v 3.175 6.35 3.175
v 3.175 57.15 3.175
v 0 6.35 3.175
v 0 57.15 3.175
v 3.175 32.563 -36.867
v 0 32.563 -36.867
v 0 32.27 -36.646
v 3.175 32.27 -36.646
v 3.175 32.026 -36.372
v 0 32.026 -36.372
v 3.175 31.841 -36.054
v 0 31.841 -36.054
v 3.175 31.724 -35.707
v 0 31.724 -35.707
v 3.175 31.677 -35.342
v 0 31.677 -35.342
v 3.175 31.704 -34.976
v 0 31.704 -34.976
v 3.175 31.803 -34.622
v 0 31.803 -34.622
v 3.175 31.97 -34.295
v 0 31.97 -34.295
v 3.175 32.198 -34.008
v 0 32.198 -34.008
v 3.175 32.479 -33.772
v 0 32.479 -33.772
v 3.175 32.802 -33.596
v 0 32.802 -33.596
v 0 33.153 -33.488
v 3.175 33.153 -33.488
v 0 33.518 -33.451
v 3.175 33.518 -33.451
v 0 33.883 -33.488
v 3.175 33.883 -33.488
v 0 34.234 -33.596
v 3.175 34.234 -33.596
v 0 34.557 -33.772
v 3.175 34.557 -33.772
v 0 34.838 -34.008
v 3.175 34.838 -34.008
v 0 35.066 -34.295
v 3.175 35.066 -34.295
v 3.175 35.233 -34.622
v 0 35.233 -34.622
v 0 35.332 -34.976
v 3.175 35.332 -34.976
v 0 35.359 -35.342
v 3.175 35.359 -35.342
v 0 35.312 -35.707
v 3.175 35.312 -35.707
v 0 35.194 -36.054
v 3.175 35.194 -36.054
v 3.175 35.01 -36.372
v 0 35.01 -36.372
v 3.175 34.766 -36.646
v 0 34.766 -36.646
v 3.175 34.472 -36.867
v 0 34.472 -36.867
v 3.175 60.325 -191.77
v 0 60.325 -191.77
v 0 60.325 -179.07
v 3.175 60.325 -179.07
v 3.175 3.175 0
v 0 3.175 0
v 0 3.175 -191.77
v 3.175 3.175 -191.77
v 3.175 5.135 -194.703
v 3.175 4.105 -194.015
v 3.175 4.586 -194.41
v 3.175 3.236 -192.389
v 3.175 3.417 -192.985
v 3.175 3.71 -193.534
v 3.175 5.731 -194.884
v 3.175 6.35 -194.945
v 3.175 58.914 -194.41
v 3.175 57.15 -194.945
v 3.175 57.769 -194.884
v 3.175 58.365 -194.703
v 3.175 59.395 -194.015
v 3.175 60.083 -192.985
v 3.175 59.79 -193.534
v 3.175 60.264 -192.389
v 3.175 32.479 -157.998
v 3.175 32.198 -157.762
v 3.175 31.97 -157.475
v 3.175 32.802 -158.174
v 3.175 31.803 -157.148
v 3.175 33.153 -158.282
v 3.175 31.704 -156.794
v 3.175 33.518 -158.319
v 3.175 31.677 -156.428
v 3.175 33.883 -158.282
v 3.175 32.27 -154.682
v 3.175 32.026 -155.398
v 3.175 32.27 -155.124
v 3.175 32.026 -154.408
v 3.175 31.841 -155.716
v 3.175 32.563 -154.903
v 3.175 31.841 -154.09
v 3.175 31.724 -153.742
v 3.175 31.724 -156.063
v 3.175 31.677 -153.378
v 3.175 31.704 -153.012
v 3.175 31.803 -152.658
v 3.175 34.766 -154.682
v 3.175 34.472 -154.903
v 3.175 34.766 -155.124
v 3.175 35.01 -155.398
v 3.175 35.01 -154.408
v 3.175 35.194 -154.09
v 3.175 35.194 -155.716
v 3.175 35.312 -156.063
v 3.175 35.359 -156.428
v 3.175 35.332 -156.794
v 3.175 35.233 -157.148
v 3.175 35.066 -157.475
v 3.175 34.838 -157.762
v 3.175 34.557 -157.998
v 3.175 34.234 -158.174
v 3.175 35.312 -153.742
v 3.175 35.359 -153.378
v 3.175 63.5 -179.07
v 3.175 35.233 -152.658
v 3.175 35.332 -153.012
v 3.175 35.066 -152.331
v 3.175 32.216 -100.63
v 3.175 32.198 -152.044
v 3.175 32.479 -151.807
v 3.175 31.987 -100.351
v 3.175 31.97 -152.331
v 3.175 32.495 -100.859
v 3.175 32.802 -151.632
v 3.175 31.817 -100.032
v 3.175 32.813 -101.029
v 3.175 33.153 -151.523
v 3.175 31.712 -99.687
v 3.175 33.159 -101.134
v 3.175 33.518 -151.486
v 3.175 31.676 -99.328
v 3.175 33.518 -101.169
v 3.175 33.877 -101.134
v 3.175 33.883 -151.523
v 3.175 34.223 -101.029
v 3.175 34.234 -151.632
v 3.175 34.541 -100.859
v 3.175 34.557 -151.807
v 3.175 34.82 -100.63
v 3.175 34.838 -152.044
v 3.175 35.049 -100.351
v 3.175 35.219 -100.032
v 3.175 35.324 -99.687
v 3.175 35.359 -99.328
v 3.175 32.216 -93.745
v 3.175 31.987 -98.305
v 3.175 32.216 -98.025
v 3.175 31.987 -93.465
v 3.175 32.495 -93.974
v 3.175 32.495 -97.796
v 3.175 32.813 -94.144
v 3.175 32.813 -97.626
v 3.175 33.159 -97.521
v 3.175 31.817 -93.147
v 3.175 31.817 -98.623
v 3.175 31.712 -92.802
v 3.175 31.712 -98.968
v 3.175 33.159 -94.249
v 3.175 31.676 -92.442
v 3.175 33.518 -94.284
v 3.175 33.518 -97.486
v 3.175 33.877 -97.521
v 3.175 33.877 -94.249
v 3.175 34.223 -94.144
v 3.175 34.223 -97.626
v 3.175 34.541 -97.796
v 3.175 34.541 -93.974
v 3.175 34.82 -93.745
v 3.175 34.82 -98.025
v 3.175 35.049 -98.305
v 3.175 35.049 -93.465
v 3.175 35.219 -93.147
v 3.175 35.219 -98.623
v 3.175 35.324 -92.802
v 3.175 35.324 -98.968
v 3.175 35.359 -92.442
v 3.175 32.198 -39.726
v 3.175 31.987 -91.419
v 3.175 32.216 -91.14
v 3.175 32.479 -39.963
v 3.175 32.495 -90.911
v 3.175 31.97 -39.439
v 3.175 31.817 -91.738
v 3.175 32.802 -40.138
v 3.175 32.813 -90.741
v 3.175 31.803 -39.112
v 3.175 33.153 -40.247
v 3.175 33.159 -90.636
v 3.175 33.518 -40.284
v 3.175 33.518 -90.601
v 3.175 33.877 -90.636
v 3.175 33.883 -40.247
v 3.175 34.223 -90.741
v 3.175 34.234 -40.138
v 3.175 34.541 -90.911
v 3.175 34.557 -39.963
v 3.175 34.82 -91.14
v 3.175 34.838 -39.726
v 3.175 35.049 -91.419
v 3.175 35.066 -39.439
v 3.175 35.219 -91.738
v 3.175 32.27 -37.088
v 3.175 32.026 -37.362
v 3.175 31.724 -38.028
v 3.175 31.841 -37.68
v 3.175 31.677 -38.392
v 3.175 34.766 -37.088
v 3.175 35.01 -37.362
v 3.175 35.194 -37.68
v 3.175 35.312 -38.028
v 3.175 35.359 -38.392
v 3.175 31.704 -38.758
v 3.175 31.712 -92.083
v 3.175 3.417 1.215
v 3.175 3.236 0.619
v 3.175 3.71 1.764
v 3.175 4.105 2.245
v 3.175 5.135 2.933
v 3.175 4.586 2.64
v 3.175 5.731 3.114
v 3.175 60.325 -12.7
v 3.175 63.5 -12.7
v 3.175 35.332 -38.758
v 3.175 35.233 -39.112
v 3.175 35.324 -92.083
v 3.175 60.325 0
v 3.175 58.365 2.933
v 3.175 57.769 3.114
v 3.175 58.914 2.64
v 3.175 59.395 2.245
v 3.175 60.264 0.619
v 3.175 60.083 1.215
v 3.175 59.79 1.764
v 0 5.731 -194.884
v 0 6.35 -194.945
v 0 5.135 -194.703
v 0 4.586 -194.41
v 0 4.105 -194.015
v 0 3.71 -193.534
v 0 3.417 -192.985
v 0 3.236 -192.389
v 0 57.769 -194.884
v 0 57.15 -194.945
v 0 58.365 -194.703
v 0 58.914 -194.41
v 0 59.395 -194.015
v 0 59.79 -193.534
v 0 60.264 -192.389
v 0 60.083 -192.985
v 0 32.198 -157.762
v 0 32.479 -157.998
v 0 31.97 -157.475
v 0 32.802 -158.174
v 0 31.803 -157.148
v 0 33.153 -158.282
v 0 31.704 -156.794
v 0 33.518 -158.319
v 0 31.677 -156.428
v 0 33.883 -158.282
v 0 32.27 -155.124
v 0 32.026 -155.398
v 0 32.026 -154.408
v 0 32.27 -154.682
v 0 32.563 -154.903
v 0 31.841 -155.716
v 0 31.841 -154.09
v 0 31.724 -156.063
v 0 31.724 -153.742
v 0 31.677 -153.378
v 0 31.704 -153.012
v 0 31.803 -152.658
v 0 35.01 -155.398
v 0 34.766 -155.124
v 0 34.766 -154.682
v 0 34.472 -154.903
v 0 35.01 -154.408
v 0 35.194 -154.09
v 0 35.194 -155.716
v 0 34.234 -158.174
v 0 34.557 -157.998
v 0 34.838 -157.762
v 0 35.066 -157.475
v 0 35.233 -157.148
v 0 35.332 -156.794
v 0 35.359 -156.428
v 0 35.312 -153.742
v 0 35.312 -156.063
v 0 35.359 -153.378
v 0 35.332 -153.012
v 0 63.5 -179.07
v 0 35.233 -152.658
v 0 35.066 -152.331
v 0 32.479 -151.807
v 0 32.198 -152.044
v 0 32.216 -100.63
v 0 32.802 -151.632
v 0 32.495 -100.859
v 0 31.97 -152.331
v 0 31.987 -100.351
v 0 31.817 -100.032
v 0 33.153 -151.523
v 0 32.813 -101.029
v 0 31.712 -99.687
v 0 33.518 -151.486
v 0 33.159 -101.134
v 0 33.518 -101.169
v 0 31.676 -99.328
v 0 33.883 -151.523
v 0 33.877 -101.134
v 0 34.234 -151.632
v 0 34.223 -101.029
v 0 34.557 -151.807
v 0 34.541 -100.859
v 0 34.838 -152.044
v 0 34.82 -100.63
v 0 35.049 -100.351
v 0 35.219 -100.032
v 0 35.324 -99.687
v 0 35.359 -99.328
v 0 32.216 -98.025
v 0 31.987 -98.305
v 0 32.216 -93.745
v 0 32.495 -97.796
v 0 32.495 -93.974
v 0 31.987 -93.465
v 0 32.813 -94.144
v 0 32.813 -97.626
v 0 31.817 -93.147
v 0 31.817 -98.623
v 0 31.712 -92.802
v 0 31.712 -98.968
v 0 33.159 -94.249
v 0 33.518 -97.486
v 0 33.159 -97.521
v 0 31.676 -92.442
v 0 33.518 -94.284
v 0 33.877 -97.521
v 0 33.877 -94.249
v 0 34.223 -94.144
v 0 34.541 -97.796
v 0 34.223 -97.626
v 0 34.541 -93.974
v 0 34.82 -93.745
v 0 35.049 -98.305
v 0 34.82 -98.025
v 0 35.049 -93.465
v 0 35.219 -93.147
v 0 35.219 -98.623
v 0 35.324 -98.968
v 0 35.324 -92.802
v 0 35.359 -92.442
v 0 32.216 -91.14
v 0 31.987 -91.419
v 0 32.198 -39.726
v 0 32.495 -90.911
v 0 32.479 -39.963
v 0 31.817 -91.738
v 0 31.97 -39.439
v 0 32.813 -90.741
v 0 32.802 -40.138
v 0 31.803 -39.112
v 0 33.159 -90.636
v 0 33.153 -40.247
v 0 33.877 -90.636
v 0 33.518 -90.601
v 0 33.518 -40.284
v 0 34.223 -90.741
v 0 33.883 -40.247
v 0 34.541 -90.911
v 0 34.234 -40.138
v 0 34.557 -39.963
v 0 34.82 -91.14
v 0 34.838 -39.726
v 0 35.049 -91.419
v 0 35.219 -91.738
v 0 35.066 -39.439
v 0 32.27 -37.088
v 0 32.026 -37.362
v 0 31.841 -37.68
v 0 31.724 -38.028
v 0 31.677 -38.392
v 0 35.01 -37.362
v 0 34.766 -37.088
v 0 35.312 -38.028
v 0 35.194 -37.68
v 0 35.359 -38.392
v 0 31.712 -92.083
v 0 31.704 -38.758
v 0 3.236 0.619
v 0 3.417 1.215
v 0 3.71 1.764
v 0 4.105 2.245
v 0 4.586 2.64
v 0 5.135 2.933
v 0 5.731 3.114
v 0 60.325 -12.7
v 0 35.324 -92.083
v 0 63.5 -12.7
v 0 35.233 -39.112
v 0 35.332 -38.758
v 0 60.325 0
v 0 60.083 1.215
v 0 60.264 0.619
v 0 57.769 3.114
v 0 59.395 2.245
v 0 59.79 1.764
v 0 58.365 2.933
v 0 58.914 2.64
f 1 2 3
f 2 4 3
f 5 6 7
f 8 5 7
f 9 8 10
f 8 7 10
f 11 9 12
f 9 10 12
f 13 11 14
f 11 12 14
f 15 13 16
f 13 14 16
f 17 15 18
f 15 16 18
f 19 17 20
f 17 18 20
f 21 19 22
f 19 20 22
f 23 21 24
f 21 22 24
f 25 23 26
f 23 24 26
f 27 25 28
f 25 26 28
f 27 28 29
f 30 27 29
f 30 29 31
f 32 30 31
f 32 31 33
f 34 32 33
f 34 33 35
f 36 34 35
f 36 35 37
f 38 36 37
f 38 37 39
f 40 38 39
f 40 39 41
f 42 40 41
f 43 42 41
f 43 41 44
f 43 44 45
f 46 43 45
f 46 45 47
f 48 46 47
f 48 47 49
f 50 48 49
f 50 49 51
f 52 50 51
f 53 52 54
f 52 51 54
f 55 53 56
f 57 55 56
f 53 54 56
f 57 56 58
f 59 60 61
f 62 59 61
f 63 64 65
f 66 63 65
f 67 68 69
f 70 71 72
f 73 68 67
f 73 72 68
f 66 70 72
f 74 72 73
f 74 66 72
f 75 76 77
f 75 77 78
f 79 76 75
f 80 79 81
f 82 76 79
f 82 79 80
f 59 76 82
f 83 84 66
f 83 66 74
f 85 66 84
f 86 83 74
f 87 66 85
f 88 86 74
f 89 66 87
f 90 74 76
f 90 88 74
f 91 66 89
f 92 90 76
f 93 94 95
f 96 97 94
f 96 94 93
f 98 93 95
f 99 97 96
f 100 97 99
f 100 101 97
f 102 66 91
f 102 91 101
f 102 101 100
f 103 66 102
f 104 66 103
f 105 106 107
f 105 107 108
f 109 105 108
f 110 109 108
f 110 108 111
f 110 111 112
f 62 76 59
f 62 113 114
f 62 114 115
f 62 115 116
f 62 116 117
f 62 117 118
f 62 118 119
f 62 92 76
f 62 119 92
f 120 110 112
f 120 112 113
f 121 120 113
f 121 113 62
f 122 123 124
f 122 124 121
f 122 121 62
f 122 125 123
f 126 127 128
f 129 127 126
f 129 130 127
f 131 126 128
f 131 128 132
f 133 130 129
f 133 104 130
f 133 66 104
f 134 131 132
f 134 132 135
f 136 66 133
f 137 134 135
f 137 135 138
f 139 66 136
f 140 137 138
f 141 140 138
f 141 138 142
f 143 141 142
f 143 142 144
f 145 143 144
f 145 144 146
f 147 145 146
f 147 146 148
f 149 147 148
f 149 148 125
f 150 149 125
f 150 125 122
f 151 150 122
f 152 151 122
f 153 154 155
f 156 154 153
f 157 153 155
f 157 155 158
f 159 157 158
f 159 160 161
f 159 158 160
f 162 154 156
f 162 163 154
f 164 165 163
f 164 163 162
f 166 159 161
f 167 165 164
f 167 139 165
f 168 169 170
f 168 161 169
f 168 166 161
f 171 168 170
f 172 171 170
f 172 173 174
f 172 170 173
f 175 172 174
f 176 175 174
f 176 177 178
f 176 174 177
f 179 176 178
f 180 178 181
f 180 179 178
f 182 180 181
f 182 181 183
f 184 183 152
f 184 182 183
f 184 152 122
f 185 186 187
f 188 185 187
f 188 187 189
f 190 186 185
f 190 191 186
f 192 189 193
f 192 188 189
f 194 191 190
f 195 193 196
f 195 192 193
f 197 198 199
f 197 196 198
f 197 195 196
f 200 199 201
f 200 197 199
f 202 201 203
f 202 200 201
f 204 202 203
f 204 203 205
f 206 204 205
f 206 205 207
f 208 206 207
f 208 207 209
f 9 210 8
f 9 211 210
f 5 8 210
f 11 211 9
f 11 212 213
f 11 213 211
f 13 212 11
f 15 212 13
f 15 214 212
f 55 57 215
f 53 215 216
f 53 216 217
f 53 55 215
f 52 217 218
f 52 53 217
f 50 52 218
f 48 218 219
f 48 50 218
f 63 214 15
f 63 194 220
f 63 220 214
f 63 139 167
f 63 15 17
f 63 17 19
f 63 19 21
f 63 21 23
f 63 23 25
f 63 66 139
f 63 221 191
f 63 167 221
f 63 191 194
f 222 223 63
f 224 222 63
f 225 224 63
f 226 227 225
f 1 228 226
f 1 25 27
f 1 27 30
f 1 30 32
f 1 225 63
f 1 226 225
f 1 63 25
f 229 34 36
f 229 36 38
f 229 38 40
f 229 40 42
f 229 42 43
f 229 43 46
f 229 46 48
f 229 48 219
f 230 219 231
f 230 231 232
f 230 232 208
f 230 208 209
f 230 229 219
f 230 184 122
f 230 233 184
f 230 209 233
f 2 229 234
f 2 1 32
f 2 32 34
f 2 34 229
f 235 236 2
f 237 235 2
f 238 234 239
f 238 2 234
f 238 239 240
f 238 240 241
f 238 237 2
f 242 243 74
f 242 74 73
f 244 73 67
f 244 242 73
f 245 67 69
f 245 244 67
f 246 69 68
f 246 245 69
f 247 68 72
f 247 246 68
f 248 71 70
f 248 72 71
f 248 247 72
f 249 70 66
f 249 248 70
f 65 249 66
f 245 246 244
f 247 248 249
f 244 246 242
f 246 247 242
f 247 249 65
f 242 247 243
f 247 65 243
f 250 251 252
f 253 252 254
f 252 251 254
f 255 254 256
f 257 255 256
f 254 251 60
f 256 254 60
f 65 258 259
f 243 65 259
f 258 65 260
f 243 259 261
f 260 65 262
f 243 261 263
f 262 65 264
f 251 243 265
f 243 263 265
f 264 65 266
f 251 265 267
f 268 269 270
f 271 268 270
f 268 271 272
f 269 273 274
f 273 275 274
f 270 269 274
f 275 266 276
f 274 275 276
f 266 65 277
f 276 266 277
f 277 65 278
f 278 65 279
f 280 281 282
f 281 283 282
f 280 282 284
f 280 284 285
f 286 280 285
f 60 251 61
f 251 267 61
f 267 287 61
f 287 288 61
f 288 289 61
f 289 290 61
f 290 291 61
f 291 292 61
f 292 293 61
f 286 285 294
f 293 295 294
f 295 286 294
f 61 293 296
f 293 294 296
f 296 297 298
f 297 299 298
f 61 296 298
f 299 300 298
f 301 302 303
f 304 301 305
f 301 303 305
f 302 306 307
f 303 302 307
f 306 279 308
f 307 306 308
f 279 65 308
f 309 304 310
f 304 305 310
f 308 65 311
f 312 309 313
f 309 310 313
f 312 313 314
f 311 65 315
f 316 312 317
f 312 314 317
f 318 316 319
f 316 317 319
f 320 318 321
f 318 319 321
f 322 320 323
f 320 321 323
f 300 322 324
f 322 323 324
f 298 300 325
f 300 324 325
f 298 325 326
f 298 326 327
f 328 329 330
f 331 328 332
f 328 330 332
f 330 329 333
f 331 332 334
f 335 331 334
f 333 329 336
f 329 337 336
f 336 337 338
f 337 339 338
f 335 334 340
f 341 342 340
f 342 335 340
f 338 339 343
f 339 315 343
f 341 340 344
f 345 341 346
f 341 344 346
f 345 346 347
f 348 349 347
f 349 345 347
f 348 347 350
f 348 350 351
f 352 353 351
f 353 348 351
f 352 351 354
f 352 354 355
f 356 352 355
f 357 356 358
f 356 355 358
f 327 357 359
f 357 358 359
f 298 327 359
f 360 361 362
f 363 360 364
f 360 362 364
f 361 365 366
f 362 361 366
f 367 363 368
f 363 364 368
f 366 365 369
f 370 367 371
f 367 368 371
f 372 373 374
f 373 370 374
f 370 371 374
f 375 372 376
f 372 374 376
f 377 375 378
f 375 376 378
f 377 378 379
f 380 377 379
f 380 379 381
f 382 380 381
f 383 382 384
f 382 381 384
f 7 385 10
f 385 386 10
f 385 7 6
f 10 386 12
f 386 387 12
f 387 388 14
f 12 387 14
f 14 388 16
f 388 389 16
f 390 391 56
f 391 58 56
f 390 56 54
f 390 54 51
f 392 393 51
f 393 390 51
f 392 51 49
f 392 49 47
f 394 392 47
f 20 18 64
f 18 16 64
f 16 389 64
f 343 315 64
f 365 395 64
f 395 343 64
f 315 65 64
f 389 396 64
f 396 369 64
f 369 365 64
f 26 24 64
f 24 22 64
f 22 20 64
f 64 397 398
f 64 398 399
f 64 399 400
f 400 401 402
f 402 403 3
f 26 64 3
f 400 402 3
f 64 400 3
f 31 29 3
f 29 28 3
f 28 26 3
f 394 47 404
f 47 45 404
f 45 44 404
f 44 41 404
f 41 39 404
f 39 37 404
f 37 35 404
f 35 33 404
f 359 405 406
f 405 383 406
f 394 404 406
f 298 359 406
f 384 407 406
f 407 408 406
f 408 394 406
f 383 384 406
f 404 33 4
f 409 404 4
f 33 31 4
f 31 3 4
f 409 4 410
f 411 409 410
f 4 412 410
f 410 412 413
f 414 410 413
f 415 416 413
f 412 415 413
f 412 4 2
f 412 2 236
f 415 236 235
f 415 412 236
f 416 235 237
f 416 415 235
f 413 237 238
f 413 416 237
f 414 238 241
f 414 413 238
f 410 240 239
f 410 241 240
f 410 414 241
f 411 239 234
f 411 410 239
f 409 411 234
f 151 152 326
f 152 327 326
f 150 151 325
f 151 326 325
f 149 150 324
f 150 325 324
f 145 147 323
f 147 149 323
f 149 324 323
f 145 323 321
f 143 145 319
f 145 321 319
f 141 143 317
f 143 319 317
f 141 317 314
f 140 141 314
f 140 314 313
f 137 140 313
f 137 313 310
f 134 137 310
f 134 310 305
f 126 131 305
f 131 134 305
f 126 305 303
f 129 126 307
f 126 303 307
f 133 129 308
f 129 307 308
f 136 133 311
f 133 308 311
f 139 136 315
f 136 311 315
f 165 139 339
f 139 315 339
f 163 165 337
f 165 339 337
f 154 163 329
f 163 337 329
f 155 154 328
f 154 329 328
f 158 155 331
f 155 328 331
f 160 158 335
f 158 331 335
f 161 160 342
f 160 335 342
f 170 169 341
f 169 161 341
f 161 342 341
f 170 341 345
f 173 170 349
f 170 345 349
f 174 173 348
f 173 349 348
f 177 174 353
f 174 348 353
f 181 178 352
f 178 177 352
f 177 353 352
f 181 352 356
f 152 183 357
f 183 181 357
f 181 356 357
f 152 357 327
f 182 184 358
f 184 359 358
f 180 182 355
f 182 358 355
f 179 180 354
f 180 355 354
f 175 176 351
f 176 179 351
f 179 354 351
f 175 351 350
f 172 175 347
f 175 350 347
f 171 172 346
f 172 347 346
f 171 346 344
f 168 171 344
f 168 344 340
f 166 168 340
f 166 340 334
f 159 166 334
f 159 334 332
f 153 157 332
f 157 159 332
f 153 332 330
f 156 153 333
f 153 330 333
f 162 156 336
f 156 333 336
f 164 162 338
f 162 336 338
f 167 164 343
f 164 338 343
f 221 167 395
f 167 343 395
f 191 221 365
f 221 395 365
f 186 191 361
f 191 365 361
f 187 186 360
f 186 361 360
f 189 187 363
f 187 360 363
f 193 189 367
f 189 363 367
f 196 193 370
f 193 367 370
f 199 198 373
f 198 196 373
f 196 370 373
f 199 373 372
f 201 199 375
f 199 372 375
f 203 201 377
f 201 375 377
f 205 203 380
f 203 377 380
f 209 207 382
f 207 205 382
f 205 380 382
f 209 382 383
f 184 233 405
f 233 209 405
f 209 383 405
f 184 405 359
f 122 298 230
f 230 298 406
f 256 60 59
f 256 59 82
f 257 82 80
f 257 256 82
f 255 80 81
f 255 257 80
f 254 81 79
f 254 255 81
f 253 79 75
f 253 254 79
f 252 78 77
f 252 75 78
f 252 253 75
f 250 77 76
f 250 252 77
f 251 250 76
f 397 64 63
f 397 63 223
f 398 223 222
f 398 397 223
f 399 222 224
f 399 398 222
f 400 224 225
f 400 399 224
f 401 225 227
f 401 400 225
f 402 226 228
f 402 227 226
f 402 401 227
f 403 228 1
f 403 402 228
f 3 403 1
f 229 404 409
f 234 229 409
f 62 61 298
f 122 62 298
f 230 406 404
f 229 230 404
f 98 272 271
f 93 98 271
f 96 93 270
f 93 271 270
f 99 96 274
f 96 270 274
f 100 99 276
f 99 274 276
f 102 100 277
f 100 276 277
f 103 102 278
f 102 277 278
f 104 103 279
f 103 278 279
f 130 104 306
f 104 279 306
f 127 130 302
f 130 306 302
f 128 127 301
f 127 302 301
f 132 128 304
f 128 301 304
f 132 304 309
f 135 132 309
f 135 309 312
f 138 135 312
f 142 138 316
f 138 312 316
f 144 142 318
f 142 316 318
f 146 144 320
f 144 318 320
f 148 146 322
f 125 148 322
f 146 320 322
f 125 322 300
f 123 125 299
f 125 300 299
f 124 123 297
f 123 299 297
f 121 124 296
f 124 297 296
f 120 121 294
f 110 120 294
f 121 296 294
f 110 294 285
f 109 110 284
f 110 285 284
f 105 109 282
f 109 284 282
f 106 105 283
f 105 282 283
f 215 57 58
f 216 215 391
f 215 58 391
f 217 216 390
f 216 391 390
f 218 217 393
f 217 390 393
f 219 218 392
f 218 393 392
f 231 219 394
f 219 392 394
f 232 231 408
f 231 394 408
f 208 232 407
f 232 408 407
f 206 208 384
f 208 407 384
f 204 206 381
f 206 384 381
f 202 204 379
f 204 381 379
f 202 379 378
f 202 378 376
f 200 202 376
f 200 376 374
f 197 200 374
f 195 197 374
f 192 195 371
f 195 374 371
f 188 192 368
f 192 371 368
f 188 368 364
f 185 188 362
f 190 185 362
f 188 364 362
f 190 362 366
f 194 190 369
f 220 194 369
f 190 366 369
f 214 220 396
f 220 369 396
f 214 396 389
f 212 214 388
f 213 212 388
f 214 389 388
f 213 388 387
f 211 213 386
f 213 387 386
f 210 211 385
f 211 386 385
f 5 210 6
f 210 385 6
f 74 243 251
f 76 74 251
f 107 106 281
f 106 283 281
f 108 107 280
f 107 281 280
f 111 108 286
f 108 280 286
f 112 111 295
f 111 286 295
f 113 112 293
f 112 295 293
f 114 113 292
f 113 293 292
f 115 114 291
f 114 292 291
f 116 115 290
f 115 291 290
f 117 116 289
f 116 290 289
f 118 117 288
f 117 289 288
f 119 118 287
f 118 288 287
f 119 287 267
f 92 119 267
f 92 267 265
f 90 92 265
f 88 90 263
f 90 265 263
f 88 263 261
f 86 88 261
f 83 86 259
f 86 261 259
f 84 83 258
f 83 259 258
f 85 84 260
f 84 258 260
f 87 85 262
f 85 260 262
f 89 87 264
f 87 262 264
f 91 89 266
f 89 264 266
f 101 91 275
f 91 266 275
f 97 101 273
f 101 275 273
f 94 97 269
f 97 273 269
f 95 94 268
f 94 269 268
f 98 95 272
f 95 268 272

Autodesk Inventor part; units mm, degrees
ref_plane "YZ Plane" through (0, 0, 0) normal (1, 0, 0) x (0, 1, 0)
ref_plane "XZ Plane" through (0, 0, 0) normal (0, 1, 0) x (-1, 0, 0)
ref_plane "XY Plane" through (0, 0, 0) normal (0, 0, 1) x (1, 0, 0)
sketch "Sketch1" plane through (0, 0, 0) normal (1, 0, 0) x (0, 1, 0)
  line L0 (63.5, -12.7) -> (60.325, -12.7)
  line L1 (60.325, -12.7) -> (60.325, 0)
  arc A0 (60.325, 0) -> (57.15, 3.175) centre (57.15, 0) ccw
  line L2 (57.15, 3.175) -> (6.35, 3.175)
  arc A1 (6.35, 3.175) -> (3.175, 0) centre (6.35, 0) ccw
  line L3 (3.175, 0) -> (3.175, -191.77)
  arc A2 (3.175, -191.77) -> (6.35, -194.945) centre (6.35, -191.77) ccw
  line L4 (6.35, -194.945) -> (57.15, -194.945)
  arc A3 (57.15, -194.945) -> (60.325, -191.77) centre (57.15, -191.77) ccw
  line L5 (60.325, -191.77) -> (60.325, -179.07)
  line L6 (60.325, -179.07) -> (63.5, -179.07)
  line L7 (63.5, -179.07) -> (63.5, -12.7)
  line L8 (60.325, -179.07) -> (63.5, -179.07)
  line L9 (60.325, -179.07) -> (60.325, -191.77)
  line L10 (63.5, -12.7) -> (60.325, -12.7)
  line L11 (60.325, -12.7) -> (60.325, 0)
  line L12 (57.15, 3.175) -> (6.35, 3.175)
  line L13 (57.15, -194.945) -> (6.35, -194.945)
  line L14 (3.175, 0) -> (3.175, -191.77)
  arc A4 (6.35, 3.175) -> (3.175, 0) centre (6.35, 0) ccw
  arc A5 (60.325, 0) -> (57.15, 3.175) centre (57.15, 0) ccw
  circle A6 centre (33.5179, -99.3276) radius 1.8415
  circle A7 centre (33.5179, -92.4424) radius 1.8415
  circle A8 centre (33.5179, -38.442) radius 1.8415
  circle A9 centre (33.5179, -35.2924) radius 1.8415
  circle A10 centre (33.5179, -153.328) radius 1.8415
  circle A11 centre (33.5179, -156.4776) radius 1.8415
  point P0 (0, 0)
extrude "Plate1" add sketch "Sketch1" along normal blind 3.175 contours L7 L6 L5 A3 L4 A2 L3 A1 L2 A0 L1 L0 | A6 | A7 | A8 A9 | A9 A8 | A8 A9 | A10 A11 | A11 A10 | A10 A11
extrude "Cut4" cut sketch "Sketch1" along normal blind 3.175 contours A6 | A7 | A8 A9 | A9 A8 | A8 A9 | A10 A11 | A11 A10 | A10 A11
equation "\"BendRadius\" = Thickness"
equation "\"BendReliefWidth\" = Thickness"
equation "\"BendReliefDepth\" = 0.5 * Thickness"
equation "\"CornerReliefSize\" = 4 * Thickness"
equation "\"MinimumRemnant\" = 2 * Thickness"
equation "\"TransitionRadius\" = BendRadius"
equation "\"JacobiRadiusSize\" = BendRadius"
equation "\"GapSize\" = Thickness"
properties part number "sides" material "Aluminum 6061"
